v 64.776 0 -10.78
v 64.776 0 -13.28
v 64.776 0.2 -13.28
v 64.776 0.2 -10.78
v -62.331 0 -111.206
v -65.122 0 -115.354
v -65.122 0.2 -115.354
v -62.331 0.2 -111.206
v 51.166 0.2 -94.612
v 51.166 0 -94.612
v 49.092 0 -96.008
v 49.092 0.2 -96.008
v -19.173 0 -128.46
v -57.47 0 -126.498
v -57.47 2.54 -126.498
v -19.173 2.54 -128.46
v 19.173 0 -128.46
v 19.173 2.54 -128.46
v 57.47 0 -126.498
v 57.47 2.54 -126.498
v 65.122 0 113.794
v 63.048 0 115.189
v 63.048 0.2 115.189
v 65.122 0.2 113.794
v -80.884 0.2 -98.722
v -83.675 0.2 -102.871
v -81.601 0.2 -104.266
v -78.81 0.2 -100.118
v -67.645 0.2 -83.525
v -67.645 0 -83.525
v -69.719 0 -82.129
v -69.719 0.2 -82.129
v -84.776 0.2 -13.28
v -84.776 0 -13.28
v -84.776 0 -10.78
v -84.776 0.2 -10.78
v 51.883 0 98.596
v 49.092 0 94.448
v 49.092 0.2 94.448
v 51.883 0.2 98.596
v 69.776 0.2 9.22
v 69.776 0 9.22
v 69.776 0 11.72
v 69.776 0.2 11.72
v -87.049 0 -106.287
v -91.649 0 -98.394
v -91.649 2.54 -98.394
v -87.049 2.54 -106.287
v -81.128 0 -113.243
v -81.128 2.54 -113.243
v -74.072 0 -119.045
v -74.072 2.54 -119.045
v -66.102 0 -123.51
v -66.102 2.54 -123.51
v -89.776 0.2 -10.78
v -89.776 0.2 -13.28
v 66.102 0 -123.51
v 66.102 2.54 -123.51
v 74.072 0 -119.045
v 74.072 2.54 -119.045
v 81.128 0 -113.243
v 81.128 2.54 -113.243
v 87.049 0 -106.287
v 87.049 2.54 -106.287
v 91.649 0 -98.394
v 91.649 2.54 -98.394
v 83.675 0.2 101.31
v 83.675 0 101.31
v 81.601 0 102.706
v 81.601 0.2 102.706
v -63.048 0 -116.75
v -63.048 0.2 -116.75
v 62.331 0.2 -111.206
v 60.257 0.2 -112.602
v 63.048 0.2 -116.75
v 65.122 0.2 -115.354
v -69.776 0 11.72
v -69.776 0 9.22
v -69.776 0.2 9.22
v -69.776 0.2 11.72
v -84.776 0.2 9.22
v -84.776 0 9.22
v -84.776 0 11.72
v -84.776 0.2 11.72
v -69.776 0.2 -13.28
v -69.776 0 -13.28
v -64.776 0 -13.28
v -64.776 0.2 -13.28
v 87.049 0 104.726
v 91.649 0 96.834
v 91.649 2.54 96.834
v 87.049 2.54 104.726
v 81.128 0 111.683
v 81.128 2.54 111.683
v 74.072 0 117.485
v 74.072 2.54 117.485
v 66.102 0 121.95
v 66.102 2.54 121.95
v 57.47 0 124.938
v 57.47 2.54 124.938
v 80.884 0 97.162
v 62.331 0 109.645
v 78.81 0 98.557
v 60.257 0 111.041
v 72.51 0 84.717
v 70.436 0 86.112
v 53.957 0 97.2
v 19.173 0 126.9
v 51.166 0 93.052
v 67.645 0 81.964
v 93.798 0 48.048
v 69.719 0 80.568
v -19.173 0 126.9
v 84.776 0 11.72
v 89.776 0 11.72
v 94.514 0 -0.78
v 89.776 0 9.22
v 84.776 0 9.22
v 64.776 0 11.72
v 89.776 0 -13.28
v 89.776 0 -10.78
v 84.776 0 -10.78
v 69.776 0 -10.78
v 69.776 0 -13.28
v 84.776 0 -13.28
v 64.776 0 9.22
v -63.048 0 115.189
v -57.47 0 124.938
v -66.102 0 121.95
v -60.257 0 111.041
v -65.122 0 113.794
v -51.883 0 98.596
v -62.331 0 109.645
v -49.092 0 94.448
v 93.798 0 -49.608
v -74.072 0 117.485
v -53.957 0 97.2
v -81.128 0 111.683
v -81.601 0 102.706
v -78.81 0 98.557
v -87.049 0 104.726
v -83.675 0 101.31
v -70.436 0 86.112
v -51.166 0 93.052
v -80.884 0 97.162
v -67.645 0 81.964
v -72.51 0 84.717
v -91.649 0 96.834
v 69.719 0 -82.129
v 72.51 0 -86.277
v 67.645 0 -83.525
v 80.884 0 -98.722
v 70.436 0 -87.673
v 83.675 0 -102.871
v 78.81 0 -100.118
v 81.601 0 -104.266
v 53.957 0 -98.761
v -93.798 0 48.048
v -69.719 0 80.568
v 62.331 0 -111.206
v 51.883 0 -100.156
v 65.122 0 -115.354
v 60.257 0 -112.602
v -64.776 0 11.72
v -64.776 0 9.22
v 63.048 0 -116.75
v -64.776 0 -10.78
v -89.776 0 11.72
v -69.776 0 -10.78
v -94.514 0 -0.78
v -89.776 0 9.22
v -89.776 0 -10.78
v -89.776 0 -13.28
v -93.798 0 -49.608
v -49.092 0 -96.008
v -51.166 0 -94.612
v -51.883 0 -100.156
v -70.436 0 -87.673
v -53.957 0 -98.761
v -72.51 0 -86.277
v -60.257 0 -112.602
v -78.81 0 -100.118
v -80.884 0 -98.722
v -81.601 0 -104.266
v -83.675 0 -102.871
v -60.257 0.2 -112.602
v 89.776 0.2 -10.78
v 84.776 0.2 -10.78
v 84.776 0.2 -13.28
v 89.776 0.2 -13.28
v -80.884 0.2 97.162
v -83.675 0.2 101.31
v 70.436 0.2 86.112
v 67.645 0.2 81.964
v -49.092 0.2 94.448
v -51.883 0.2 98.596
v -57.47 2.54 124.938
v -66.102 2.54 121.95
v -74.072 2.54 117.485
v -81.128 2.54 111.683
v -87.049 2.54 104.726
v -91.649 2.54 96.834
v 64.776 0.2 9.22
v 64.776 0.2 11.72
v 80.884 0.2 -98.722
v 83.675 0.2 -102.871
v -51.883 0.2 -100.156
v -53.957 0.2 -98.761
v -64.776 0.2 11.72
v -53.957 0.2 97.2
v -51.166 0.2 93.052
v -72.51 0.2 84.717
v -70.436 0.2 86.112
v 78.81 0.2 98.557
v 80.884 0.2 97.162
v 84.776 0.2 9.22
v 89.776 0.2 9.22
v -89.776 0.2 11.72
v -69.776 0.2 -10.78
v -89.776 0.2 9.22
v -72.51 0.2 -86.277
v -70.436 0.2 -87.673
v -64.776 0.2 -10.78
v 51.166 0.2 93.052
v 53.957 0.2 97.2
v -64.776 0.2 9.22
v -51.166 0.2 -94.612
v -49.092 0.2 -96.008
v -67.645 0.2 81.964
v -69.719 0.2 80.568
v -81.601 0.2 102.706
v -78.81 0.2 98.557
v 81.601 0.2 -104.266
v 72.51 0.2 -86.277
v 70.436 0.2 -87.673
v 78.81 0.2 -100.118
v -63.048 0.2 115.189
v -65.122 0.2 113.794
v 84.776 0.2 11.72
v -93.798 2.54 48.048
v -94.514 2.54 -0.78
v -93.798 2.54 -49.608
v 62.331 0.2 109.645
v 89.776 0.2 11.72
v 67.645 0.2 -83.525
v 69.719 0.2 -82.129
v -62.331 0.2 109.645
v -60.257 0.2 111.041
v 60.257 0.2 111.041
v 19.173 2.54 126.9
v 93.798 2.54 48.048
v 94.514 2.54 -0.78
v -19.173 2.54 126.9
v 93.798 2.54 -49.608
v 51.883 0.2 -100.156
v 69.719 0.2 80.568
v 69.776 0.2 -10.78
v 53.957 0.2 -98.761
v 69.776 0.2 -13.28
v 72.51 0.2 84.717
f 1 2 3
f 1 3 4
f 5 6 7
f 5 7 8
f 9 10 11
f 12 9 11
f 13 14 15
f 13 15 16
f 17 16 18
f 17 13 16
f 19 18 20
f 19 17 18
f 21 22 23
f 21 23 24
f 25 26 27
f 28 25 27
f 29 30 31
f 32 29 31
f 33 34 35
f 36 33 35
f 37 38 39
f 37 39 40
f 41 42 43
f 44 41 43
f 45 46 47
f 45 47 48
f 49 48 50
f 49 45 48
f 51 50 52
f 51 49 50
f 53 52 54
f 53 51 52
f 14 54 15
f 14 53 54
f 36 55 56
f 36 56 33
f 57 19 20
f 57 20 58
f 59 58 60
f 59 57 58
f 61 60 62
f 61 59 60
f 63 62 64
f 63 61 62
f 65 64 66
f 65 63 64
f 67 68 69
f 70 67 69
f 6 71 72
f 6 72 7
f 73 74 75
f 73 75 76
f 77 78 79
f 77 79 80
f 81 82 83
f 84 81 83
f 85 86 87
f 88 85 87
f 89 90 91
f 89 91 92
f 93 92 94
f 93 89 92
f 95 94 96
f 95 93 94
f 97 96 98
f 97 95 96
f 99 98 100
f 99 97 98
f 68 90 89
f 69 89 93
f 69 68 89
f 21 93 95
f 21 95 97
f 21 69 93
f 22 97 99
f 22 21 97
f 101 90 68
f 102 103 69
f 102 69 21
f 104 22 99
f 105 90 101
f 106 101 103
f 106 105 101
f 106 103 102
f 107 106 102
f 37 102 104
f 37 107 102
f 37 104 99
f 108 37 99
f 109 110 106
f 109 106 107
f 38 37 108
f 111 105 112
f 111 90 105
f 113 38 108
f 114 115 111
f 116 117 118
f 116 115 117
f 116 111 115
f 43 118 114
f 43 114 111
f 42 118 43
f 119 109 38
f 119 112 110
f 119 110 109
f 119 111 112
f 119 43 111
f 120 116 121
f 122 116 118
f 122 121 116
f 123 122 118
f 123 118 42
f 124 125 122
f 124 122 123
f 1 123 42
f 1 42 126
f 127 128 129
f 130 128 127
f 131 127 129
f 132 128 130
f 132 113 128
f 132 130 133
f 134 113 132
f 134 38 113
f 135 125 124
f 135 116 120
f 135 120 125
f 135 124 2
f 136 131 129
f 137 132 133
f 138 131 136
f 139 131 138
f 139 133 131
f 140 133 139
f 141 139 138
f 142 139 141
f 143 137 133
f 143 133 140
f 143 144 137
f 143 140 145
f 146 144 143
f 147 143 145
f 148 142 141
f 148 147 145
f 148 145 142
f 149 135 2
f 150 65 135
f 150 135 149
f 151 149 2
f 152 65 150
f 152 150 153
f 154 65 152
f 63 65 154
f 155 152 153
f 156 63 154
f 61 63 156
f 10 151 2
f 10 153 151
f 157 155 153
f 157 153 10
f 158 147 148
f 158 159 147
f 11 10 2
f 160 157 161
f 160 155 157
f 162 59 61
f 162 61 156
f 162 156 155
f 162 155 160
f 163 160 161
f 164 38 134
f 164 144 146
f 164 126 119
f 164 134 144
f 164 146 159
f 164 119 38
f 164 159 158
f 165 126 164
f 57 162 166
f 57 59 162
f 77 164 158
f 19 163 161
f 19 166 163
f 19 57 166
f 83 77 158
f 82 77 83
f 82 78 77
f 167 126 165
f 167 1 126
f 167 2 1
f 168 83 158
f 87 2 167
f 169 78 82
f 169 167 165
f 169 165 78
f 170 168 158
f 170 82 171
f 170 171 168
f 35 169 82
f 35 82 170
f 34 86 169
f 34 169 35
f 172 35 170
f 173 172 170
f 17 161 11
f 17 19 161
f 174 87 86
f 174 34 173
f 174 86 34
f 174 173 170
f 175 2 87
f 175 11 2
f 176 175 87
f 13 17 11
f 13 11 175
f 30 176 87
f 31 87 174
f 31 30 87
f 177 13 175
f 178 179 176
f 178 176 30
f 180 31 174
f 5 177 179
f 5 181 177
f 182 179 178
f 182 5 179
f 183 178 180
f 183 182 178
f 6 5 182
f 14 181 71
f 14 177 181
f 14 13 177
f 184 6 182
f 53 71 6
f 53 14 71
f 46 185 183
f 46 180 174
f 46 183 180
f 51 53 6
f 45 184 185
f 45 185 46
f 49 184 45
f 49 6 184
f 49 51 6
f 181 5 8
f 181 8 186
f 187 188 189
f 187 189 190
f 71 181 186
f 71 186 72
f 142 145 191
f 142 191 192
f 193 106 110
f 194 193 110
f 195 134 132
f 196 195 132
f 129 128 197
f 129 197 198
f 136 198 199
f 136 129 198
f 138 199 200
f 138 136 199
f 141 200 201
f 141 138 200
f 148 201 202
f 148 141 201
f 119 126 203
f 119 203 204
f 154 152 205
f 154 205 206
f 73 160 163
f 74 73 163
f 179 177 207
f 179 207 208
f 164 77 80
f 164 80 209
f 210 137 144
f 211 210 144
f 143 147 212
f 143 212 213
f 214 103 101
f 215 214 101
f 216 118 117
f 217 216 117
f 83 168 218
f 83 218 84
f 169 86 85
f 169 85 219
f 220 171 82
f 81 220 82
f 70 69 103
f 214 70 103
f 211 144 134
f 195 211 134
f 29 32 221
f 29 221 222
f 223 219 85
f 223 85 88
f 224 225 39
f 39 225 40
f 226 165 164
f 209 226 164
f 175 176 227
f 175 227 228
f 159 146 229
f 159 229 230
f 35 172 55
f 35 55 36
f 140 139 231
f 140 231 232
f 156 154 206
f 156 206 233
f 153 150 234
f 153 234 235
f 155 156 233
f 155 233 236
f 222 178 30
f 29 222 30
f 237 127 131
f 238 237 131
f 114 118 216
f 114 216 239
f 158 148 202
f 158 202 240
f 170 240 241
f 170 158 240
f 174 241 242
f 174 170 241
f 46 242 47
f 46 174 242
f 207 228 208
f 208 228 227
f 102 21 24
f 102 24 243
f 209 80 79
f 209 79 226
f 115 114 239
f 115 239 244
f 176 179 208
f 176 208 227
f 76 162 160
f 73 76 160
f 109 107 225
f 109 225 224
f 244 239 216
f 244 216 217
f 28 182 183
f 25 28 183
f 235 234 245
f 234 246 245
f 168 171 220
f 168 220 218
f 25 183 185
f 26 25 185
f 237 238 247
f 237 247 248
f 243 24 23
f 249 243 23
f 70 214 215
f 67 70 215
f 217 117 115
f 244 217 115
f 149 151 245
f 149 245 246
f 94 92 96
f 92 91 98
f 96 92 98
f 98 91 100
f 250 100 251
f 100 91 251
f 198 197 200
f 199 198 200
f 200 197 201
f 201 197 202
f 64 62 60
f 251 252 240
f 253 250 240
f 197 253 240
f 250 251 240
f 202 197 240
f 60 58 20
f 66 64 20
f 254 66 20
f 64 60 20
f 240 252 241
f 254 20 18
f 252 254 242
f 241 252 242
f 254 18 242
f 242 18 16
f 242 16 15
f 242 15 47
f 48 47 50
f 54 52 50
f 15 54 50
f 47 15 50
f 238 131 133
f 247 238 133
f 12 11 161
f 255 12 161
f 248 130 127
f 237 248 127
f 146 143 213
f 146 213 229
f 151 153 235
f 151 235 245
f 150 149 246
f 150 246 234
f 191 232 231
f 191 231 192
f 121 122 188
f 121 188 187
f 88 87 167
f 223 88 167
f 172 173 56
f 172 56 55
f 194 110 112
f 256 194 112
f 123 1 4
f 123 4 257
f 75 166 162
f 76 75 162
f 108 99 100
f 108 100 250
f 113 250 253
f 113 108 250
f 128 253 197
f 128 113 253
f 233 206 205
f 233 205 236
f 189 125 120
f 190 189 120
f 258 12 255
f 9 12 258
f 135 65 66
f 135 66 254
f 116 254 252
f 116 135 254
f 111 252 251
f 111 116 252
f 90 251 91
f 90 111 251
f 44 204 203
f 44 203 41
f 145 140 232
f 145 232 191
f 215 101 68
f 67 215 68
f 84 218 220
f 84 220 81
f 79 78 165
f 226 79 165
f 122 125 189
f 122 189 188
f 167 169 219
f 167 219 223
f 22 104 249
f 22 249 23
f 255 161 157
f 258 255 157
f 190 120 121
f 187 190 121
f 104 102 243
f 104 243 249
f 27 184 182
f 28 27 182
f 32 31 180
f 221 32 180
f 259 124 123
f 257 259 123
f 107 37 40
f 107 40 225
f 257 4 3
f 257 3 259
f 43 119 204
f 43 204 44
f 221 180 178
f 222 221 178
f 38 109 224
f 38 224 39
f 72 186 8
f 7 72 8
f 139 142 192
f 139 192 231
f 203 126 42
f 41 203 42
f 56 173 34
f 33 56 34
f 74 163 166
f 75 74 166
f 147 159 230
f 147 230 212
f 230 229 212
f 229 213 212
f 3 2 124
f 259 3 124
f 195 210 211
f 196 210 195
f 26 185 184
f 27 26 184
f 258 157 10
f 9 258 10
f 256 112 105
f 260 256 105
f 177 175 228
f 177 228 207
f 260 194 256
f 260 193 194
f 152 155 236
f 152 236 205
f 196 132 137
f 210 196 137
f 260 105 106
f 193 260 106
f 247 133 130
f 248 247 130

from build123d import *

# Parameters (mm, degrees)
BOSS_EXTRUDE1_DEPTH = 2.54
SKETCH6_W           = 5
SKETCH6_H           = 2.5
CUT_EXTRUDE2_DEPTH  = 0.2


with BuildPart() as part:
    # Sketch3 → Boss-Extrude1 (new body)
    with BuildSketch(Plane(origin=(0, 0, 0), x_dir=(1, 0, 0), z_dir=(0, 1, 0))):
        with BuildLine():
            ThreePointArc((-91.6492325, -96.833825344), (-94.514268143, 0.78027625), (-91.6492325, 98.394377843))
            ThreePointArc((-91.6492325, 98.394377843), (-77.728790436, 116.300836492), (-57.46959223, 126.498133029))
            ThreePointArc((-57.46959223, 126.498133029), (0, 128.705492461), (57.46959223, 126.498133029))
            ThreePointArc((57.46959223, 126.498133029), (77.728790436, 116.300836492), (91.6492325, 98.394377843))
            ThreePointArc((91.6492325, 98.394377843), (94.514268143, 0.78027625), (91.6492325, -96.833825344))
            ThreePointArc((91.6492325, -96.833825344), (77.728790436, -114.740283992), (57.46959223, -124.937580529))
            ThreePointArc((57.46959223, -124.937580529), (0, -127.144939961), (-57.46959223, -124.937580529))
            ThreePointArc((-57.46959223, -124.937580529), (-77.728790436, -114.740283992), (-91.6492325, -96.833825344))
        make_face()
    extrude(amount=BOSS_EXTRUDE1_DEPTH)

    # Sketch6 → Cut-Extrude2 (cut)
    with BuildSketch(Plane.XZ):
        Polygon((-80.884003768, 97.161784557), (-83.675257034, 101.310146306), (-81.601076159, 102.705772939), (-78.809822893, 98.55741119), align=None)
        Polygon((-60.2566864, 111.041014588), (-63.047939666, 115.189376338), (-65.122120541, 113.793749705), (-62.330867275, 109.645387955), align=None)
        Polygon((-67.644809829, 81.963964192), (-69.718990703, 80.568337559), (-72.510243969, 84.716699309), (-70.436063095, 86.112325942), align=None)
        Polygon((-51.16585421, 93.051940957), (-49.091673336, 94.44756759), (-51.882926602, 98.59592934), (-53.957107476, 97.200302707), align=None)
        Polygon((51.882926602, 98.59592934), (53.957107476, 97.200302707), (51.16585421, 93.051940957), (49.091673336, 94.44756759), align=None)
        Polygon((65.122120541, 113.793749705), (62.330867275, 109.645387955), (60.2566864, 111.041014588), (63.047939666, 115.189376338), align=None)
        Polygon((67.644809829, 81.963964192), (69.718990703, 80.568337559), (72.510243969, 84.716699309), (70.436063095, 86.112325942), align=None)
        Polygon((80.884003768, 97.161784557), (83.675257034, 101.310146306), (81.601076159, 102.705772939), (78.809822893, 98.55741119), align=None)
        with Locations((67.276236393, 10.46972375)):
            Rectangle(SKETCH6_W, SKETCH6_H)
        with Locations((87.276236393, 10.46972375)):
            Rectangle(SKETCH6_W, SKETCH6_H)
        with Locations((67.276236393, -12.03027625)):
            Rectangle(SKETCH6_W, SKETCH6_H)
        with Locations((87.276236393, -12.03027625)):
            Rectangle(SKETCH6_W, SKETCH6_H)
        Polygon((72.510243969, -86.277251808), (70.436063095, -87.672878441), (67.644809829, -83.524516692), (69.718990703, -82.128890059), align=None)
        Polygon((81.601076159, -104.266325439), (78.809822893, -100.11796369), (80.884003768, -98.722337057), (83.675257034, -102.870698806), align=None)
        Polygon((60.2566864, -112.601567088), (63.047939666, -116.749928837), (65.122120541, -115.354302204), (62.330867275, -111.205940455), align=None)
        Polygon((51.16585421, -94.612493457), (49.091673336, -96.00812009), (51.882926602, -100.15648184), (53.957107476, -98.760855207), align=None)
        Polygon((-65.122120541, -115.354302204), (-62.330867275, -111.205940455), (-60.2566864, -112.601567088), (-63.047939666, -116.749928837), align=None)
        Polygon((-51.882926602, -100.15648184), (-53.957107476, -98.760855207), (-51.16585421, -94.612493457), (-49.091673336, -96.00812009), align=None)
        Polygon((-80.884003768, -98.722337057), (-83.675257034, -102.870698806), (-81.601076159, -104.266325439), (-78.809822893, -100.11796369), align=None)
        Polygon((-67.644809829, -83.524516692), (-69.718990703, -82.128890059), (-72.510243969, -86.277251808), (-70.436063095, -87.672878441), align=None)
        with Locations((-67.276236393, 10.46972375)):
            Rectangle(SKETCH6_W, SKETCH6_H)
        with Locations((-67.276236393, -12.03027625)):
            Rectangle(SKETCH6_W, SKETCH6_H)
        with Locations((-87.276236393, -12.03027625)):
            Rectangle(SKETCH6_W, SKETCH6_H)
        with Locations((-87.276236393, 10.46972375)):
            Rectangle(SKETCH6_W, SKETCH6_H)
    extrude(amount=-CUT_EXTRUDE2_DEPTH, mode=Mode.SUBTRACT)


solid = part.part
